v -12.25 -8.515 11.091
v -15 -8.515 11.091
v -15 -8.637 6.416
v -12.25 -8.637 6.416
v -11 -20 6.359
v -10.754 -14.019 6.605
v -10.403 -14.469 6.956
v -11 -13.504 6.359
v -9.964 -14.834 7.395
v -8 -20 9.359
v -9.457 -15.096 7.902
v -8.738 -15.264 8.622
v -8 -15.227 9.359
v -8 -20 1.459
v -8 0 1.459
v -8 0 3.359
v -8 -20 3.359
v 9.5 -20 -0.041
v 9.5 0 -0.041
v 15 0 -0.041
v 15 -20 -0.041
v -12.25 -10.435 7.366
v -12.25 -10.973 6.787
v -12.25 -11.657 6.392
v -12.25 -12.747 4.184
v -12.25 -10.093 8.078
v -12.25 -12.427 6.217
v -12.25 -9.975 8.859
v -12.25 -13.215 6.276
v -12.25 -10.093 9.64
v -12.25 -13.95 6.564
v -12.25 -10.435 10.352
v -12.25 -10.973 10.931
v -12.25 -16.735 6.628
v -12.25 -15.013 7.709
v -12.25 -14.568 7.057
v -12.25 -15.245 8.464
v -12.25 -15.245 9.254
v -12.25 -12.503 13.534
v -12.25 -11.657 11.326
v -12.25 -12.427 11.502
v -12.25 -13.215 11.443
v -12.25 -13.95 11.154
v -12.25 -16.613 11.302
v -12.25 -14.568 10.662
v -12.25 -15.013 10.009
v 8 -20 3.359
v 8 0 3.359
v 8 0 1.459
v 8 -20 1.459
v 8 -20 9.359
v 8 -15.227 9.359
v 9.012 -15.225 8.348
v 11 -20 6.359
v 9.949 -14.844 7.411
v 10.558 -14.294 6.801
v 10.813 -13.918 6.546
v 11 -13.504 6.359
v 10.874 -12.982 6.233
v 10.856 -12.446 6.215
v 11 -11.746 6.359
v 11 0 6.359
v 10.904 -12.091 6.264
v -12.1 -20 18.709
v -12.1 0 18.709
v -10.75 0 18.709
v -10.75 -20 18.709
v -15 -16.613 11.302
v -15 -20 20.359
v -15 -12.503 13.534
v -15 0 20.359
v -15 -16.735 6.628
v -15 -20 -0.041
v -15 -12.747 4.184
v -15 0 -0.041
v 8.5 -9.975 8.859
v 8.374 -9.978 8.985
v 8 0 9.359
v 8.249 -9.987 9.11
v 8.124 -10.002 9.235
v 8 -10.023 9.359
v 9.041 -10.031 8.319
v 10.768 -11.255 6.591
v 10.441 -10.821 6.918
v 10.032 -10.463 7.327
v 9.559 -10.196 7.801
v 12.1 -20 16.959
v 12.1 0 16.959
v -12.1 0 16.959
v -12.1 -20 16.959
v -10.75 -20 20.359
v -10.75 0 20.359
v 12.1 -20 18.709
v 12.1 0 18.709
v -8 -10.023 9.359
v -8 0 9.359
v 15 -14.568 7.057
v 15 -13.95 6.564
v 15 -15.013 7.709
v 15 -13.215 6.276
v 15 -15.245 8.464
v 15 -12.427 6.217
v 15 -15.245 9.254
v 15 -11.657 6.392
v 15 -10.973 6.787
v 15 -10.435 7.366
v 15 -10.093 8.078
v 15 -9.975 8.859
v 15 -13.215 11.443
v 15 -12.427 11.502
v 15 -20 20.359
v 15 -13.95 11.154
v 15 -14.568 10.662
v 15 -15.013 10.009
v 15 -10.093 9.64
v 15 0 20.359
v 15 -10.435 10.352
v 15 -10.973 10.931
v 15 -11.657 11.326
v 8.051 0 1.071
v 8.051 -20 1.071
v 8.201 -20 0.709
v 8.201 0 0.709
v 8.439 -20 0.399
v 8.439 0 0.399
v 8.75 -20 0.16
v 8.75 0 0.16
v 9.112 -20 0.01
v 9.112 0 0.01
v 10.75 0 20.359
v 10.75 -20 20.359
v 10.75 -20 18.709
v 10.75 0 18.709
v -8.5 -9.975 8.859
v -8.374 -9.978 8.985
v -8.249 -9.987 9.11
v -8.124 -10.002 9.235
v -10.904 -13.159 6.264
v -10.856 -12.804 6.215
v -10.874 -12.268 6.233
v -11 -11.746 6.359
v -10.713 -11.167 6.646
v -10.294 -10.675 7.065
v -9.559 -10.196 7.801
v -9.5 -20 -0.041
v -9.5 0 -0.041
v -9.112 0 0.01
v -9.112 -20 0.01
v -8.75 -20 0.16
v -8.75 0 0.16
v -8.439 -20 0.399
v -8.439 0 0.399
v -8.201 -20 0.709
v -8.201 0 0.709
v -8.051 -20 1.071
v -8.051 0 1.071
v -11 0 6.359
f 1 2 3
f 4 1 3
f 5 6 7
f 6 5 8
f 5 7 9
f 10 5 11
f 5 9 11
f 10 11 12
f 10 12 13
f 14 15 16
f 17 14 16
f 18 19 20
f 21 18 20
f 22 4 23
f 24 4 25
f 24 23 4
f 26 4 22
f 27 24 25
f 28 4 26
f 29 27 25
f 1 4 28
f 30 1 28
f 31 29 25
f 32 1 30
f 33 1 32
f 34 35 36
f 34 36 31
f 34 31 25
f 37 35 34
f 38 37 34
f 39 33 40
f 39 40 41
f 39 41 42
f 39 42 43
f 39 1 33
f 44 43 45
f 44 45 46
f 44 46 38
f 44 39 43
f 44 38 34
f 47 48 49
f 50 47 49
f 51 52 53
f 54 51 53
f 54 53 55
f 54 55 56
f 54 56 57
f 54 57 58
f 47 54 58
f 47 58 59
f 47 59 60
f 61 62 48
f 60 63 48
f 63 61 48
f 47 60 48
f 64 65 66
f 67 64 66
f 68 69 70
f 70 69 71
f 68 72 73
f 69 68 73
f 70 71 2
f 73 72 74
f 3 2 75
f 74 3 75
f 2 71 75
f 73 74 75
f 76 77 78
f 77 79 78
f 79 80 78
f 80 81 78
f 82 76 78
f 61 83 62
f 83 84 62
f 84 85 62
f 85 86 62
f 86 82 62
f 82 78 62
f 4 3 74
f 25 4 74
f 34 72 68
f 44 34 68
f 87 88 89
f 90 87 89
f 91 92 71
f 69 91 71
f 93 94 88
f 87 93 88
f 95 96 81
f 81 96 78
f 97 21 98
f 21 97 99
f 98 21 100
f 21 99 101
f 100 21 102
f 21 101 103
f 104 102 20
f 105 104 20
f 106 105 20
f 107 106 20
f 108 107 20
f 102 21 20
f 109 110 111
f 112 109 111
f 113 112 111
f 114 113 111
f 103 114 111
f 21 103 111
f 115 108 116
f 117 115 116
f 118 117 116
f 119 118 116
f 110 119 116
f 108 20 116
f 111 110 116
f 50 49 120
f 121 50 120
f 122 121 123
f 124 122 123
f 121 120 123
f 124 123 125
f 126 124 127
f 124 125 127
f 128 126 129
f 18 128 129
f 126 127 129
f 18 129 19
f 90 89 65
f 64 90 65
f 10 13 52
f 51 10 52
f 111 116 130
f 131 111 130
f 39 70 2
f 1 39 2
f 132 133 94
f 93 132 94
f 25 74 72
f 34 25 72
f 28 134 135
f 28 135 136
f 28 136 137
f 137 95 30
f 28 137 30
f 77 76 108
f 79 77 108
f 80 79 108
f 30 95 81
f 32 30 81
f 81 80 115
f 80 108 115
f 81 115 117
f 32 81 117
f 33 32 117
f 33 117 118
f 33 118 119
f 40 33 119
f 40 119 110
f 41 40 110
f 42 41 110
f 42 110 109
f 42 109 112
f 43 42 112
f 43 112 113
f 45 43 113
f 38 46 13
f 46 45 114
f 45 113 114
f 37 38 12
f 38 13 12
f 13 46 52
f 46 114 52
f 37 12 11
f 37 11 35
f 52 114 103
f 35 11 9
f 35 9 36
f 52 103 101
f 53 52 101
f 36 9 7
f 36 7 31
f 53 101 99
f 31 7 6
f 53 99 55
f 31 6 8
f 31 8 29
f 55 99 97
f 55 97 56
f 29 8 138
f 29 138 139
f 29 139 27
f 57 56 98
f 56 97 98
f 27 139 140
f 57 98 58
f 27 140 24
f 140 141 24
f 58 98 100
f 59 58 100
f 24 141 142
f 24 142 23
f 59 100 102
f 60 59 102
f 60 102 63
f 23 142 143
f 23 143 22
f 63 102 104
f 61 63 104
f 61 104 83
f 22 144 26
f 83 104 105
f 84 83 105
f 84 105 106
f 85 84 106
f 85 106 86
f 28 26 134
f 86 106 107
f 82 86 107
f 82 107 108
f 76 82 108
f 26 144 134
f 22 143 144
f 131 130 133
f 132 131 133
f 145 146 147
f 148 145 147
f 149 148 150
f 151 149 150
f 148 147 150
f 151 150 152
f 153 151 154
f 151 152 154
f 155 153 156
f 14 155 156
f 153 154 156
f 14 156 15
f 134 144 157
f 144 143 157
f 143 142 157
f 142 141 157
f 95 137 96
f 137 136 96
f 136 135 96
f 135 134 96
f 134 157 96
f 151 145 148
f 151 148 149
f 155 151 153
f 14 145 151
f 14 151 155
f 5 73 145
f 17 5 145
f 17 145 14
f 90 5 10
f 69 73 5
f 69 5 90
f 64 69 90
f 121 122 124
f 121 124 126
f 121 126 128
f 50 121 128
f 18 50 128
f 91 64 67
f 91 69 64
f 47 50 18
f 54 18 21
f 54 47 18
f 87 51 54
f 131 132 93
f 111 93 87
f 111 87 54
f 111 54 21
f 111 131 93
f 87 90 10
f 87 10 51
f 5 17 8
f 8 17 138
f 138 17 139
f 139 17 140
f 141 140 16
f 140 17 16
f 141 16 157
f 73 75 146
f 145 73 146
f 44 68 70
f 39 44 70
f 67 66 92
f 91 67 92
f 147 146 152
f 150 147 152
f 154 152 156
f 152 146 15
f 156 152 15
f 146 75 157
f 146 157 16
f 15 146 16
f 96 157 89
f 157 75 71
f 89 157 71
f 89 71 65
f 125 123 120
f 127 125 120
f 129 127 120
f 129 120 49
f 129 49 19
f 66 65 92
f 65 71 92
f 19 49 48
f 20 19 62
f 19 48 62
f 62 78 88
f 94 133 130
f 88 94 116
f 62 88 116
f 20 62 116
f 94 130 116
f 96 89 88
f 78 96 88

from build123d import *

# Parameters (mm, degrees)
F1_DEPTH = 20
F2_R     = 2.65
F3_DEPTH = 30
F5_DEPTH = 2.75


with BuildPart() as f1:
    # F0 (on Front) → F1 (new body)
    with BuildSketch(Plane.XZ):
        with BuildLine():
            Line((12.1, 16.959205), (-12.1, 16.959205))
            Line((-12.1, 16.959205), (-12.1, 18.709205))
            Line((-12.1, 18.709205), (-10.75, 18.709205))
            Line((-10.75, 18.709205), (-10.75, 20.359205))
            Line((-10.75, 20.359205), (-15, 20.359205))
            Line((-15, 20.359205), (-15, -0.040795))
            Line((-15, -0.040795), (-9.5, -0.040795))
            ThreePointArc((-9.5, -0.040795), (-8.43934, 0.398545), (-8, 1.459205))
            Line((-8, 1.459205), (-8, 3.359205))
            Line((-8, 3.359205), (-11, 6.359205))
            Line((-11, 6.359205), (-8, 9.359205))
            Line((-8, 9.359205), (8, 9.359205))
            Line((8, 9.359205), (11, 6.359205))
            Line((11, 6.359205), (8, 3.359205))
            Line((8, 3.359205), (8, 1.459205))
            ThreePointArc((8, 1.459205), (8.43934, 0.398545), (9.5, -0.040795))
            Line((9.5, -0.040795), (15, -0.040795))
            Line((15, -0.040795), (15, 20.359205))
            Line((15, 20.359205), (10.75, 20.359205))
            Line((10.75, 20.359205), (10.75, 18.709205))
            Line((10.75, 18.709205), (12.1, 18.709205))
            Line((12.1, 18.709205), (12.1, 16.959205))
        make_face()
    extrude(amount=F1_DEPTH)

    # F2 (on face) → F3 (cut)
    with BuildSketch(Plane.YZ.offset(15)):
        with Locations((-12.625, 8.859205)):
            Circle(F2_R)
    extrude(amount=-F3_DEPTH, mode=Mode.SUBTRACT)

    # F4 (on face) → F5 (cut)
    with BuildSketch(Plane(origin=(-15, 0, 0), x_dir=(0, -1, 0), z_dir=(-1, 0, 0))):
        Polygon((16.61254, 11.302466), (12.502844, 13.534147), (8.515304, 11.090886), (8.63746, 6.415944), (12.747156, 4.184264), (16.734696, 6.627525), align=None)
    extrude(amount=-F5_DEPTH, mode=Mode.SUBTRACT)


solid = f1.part
